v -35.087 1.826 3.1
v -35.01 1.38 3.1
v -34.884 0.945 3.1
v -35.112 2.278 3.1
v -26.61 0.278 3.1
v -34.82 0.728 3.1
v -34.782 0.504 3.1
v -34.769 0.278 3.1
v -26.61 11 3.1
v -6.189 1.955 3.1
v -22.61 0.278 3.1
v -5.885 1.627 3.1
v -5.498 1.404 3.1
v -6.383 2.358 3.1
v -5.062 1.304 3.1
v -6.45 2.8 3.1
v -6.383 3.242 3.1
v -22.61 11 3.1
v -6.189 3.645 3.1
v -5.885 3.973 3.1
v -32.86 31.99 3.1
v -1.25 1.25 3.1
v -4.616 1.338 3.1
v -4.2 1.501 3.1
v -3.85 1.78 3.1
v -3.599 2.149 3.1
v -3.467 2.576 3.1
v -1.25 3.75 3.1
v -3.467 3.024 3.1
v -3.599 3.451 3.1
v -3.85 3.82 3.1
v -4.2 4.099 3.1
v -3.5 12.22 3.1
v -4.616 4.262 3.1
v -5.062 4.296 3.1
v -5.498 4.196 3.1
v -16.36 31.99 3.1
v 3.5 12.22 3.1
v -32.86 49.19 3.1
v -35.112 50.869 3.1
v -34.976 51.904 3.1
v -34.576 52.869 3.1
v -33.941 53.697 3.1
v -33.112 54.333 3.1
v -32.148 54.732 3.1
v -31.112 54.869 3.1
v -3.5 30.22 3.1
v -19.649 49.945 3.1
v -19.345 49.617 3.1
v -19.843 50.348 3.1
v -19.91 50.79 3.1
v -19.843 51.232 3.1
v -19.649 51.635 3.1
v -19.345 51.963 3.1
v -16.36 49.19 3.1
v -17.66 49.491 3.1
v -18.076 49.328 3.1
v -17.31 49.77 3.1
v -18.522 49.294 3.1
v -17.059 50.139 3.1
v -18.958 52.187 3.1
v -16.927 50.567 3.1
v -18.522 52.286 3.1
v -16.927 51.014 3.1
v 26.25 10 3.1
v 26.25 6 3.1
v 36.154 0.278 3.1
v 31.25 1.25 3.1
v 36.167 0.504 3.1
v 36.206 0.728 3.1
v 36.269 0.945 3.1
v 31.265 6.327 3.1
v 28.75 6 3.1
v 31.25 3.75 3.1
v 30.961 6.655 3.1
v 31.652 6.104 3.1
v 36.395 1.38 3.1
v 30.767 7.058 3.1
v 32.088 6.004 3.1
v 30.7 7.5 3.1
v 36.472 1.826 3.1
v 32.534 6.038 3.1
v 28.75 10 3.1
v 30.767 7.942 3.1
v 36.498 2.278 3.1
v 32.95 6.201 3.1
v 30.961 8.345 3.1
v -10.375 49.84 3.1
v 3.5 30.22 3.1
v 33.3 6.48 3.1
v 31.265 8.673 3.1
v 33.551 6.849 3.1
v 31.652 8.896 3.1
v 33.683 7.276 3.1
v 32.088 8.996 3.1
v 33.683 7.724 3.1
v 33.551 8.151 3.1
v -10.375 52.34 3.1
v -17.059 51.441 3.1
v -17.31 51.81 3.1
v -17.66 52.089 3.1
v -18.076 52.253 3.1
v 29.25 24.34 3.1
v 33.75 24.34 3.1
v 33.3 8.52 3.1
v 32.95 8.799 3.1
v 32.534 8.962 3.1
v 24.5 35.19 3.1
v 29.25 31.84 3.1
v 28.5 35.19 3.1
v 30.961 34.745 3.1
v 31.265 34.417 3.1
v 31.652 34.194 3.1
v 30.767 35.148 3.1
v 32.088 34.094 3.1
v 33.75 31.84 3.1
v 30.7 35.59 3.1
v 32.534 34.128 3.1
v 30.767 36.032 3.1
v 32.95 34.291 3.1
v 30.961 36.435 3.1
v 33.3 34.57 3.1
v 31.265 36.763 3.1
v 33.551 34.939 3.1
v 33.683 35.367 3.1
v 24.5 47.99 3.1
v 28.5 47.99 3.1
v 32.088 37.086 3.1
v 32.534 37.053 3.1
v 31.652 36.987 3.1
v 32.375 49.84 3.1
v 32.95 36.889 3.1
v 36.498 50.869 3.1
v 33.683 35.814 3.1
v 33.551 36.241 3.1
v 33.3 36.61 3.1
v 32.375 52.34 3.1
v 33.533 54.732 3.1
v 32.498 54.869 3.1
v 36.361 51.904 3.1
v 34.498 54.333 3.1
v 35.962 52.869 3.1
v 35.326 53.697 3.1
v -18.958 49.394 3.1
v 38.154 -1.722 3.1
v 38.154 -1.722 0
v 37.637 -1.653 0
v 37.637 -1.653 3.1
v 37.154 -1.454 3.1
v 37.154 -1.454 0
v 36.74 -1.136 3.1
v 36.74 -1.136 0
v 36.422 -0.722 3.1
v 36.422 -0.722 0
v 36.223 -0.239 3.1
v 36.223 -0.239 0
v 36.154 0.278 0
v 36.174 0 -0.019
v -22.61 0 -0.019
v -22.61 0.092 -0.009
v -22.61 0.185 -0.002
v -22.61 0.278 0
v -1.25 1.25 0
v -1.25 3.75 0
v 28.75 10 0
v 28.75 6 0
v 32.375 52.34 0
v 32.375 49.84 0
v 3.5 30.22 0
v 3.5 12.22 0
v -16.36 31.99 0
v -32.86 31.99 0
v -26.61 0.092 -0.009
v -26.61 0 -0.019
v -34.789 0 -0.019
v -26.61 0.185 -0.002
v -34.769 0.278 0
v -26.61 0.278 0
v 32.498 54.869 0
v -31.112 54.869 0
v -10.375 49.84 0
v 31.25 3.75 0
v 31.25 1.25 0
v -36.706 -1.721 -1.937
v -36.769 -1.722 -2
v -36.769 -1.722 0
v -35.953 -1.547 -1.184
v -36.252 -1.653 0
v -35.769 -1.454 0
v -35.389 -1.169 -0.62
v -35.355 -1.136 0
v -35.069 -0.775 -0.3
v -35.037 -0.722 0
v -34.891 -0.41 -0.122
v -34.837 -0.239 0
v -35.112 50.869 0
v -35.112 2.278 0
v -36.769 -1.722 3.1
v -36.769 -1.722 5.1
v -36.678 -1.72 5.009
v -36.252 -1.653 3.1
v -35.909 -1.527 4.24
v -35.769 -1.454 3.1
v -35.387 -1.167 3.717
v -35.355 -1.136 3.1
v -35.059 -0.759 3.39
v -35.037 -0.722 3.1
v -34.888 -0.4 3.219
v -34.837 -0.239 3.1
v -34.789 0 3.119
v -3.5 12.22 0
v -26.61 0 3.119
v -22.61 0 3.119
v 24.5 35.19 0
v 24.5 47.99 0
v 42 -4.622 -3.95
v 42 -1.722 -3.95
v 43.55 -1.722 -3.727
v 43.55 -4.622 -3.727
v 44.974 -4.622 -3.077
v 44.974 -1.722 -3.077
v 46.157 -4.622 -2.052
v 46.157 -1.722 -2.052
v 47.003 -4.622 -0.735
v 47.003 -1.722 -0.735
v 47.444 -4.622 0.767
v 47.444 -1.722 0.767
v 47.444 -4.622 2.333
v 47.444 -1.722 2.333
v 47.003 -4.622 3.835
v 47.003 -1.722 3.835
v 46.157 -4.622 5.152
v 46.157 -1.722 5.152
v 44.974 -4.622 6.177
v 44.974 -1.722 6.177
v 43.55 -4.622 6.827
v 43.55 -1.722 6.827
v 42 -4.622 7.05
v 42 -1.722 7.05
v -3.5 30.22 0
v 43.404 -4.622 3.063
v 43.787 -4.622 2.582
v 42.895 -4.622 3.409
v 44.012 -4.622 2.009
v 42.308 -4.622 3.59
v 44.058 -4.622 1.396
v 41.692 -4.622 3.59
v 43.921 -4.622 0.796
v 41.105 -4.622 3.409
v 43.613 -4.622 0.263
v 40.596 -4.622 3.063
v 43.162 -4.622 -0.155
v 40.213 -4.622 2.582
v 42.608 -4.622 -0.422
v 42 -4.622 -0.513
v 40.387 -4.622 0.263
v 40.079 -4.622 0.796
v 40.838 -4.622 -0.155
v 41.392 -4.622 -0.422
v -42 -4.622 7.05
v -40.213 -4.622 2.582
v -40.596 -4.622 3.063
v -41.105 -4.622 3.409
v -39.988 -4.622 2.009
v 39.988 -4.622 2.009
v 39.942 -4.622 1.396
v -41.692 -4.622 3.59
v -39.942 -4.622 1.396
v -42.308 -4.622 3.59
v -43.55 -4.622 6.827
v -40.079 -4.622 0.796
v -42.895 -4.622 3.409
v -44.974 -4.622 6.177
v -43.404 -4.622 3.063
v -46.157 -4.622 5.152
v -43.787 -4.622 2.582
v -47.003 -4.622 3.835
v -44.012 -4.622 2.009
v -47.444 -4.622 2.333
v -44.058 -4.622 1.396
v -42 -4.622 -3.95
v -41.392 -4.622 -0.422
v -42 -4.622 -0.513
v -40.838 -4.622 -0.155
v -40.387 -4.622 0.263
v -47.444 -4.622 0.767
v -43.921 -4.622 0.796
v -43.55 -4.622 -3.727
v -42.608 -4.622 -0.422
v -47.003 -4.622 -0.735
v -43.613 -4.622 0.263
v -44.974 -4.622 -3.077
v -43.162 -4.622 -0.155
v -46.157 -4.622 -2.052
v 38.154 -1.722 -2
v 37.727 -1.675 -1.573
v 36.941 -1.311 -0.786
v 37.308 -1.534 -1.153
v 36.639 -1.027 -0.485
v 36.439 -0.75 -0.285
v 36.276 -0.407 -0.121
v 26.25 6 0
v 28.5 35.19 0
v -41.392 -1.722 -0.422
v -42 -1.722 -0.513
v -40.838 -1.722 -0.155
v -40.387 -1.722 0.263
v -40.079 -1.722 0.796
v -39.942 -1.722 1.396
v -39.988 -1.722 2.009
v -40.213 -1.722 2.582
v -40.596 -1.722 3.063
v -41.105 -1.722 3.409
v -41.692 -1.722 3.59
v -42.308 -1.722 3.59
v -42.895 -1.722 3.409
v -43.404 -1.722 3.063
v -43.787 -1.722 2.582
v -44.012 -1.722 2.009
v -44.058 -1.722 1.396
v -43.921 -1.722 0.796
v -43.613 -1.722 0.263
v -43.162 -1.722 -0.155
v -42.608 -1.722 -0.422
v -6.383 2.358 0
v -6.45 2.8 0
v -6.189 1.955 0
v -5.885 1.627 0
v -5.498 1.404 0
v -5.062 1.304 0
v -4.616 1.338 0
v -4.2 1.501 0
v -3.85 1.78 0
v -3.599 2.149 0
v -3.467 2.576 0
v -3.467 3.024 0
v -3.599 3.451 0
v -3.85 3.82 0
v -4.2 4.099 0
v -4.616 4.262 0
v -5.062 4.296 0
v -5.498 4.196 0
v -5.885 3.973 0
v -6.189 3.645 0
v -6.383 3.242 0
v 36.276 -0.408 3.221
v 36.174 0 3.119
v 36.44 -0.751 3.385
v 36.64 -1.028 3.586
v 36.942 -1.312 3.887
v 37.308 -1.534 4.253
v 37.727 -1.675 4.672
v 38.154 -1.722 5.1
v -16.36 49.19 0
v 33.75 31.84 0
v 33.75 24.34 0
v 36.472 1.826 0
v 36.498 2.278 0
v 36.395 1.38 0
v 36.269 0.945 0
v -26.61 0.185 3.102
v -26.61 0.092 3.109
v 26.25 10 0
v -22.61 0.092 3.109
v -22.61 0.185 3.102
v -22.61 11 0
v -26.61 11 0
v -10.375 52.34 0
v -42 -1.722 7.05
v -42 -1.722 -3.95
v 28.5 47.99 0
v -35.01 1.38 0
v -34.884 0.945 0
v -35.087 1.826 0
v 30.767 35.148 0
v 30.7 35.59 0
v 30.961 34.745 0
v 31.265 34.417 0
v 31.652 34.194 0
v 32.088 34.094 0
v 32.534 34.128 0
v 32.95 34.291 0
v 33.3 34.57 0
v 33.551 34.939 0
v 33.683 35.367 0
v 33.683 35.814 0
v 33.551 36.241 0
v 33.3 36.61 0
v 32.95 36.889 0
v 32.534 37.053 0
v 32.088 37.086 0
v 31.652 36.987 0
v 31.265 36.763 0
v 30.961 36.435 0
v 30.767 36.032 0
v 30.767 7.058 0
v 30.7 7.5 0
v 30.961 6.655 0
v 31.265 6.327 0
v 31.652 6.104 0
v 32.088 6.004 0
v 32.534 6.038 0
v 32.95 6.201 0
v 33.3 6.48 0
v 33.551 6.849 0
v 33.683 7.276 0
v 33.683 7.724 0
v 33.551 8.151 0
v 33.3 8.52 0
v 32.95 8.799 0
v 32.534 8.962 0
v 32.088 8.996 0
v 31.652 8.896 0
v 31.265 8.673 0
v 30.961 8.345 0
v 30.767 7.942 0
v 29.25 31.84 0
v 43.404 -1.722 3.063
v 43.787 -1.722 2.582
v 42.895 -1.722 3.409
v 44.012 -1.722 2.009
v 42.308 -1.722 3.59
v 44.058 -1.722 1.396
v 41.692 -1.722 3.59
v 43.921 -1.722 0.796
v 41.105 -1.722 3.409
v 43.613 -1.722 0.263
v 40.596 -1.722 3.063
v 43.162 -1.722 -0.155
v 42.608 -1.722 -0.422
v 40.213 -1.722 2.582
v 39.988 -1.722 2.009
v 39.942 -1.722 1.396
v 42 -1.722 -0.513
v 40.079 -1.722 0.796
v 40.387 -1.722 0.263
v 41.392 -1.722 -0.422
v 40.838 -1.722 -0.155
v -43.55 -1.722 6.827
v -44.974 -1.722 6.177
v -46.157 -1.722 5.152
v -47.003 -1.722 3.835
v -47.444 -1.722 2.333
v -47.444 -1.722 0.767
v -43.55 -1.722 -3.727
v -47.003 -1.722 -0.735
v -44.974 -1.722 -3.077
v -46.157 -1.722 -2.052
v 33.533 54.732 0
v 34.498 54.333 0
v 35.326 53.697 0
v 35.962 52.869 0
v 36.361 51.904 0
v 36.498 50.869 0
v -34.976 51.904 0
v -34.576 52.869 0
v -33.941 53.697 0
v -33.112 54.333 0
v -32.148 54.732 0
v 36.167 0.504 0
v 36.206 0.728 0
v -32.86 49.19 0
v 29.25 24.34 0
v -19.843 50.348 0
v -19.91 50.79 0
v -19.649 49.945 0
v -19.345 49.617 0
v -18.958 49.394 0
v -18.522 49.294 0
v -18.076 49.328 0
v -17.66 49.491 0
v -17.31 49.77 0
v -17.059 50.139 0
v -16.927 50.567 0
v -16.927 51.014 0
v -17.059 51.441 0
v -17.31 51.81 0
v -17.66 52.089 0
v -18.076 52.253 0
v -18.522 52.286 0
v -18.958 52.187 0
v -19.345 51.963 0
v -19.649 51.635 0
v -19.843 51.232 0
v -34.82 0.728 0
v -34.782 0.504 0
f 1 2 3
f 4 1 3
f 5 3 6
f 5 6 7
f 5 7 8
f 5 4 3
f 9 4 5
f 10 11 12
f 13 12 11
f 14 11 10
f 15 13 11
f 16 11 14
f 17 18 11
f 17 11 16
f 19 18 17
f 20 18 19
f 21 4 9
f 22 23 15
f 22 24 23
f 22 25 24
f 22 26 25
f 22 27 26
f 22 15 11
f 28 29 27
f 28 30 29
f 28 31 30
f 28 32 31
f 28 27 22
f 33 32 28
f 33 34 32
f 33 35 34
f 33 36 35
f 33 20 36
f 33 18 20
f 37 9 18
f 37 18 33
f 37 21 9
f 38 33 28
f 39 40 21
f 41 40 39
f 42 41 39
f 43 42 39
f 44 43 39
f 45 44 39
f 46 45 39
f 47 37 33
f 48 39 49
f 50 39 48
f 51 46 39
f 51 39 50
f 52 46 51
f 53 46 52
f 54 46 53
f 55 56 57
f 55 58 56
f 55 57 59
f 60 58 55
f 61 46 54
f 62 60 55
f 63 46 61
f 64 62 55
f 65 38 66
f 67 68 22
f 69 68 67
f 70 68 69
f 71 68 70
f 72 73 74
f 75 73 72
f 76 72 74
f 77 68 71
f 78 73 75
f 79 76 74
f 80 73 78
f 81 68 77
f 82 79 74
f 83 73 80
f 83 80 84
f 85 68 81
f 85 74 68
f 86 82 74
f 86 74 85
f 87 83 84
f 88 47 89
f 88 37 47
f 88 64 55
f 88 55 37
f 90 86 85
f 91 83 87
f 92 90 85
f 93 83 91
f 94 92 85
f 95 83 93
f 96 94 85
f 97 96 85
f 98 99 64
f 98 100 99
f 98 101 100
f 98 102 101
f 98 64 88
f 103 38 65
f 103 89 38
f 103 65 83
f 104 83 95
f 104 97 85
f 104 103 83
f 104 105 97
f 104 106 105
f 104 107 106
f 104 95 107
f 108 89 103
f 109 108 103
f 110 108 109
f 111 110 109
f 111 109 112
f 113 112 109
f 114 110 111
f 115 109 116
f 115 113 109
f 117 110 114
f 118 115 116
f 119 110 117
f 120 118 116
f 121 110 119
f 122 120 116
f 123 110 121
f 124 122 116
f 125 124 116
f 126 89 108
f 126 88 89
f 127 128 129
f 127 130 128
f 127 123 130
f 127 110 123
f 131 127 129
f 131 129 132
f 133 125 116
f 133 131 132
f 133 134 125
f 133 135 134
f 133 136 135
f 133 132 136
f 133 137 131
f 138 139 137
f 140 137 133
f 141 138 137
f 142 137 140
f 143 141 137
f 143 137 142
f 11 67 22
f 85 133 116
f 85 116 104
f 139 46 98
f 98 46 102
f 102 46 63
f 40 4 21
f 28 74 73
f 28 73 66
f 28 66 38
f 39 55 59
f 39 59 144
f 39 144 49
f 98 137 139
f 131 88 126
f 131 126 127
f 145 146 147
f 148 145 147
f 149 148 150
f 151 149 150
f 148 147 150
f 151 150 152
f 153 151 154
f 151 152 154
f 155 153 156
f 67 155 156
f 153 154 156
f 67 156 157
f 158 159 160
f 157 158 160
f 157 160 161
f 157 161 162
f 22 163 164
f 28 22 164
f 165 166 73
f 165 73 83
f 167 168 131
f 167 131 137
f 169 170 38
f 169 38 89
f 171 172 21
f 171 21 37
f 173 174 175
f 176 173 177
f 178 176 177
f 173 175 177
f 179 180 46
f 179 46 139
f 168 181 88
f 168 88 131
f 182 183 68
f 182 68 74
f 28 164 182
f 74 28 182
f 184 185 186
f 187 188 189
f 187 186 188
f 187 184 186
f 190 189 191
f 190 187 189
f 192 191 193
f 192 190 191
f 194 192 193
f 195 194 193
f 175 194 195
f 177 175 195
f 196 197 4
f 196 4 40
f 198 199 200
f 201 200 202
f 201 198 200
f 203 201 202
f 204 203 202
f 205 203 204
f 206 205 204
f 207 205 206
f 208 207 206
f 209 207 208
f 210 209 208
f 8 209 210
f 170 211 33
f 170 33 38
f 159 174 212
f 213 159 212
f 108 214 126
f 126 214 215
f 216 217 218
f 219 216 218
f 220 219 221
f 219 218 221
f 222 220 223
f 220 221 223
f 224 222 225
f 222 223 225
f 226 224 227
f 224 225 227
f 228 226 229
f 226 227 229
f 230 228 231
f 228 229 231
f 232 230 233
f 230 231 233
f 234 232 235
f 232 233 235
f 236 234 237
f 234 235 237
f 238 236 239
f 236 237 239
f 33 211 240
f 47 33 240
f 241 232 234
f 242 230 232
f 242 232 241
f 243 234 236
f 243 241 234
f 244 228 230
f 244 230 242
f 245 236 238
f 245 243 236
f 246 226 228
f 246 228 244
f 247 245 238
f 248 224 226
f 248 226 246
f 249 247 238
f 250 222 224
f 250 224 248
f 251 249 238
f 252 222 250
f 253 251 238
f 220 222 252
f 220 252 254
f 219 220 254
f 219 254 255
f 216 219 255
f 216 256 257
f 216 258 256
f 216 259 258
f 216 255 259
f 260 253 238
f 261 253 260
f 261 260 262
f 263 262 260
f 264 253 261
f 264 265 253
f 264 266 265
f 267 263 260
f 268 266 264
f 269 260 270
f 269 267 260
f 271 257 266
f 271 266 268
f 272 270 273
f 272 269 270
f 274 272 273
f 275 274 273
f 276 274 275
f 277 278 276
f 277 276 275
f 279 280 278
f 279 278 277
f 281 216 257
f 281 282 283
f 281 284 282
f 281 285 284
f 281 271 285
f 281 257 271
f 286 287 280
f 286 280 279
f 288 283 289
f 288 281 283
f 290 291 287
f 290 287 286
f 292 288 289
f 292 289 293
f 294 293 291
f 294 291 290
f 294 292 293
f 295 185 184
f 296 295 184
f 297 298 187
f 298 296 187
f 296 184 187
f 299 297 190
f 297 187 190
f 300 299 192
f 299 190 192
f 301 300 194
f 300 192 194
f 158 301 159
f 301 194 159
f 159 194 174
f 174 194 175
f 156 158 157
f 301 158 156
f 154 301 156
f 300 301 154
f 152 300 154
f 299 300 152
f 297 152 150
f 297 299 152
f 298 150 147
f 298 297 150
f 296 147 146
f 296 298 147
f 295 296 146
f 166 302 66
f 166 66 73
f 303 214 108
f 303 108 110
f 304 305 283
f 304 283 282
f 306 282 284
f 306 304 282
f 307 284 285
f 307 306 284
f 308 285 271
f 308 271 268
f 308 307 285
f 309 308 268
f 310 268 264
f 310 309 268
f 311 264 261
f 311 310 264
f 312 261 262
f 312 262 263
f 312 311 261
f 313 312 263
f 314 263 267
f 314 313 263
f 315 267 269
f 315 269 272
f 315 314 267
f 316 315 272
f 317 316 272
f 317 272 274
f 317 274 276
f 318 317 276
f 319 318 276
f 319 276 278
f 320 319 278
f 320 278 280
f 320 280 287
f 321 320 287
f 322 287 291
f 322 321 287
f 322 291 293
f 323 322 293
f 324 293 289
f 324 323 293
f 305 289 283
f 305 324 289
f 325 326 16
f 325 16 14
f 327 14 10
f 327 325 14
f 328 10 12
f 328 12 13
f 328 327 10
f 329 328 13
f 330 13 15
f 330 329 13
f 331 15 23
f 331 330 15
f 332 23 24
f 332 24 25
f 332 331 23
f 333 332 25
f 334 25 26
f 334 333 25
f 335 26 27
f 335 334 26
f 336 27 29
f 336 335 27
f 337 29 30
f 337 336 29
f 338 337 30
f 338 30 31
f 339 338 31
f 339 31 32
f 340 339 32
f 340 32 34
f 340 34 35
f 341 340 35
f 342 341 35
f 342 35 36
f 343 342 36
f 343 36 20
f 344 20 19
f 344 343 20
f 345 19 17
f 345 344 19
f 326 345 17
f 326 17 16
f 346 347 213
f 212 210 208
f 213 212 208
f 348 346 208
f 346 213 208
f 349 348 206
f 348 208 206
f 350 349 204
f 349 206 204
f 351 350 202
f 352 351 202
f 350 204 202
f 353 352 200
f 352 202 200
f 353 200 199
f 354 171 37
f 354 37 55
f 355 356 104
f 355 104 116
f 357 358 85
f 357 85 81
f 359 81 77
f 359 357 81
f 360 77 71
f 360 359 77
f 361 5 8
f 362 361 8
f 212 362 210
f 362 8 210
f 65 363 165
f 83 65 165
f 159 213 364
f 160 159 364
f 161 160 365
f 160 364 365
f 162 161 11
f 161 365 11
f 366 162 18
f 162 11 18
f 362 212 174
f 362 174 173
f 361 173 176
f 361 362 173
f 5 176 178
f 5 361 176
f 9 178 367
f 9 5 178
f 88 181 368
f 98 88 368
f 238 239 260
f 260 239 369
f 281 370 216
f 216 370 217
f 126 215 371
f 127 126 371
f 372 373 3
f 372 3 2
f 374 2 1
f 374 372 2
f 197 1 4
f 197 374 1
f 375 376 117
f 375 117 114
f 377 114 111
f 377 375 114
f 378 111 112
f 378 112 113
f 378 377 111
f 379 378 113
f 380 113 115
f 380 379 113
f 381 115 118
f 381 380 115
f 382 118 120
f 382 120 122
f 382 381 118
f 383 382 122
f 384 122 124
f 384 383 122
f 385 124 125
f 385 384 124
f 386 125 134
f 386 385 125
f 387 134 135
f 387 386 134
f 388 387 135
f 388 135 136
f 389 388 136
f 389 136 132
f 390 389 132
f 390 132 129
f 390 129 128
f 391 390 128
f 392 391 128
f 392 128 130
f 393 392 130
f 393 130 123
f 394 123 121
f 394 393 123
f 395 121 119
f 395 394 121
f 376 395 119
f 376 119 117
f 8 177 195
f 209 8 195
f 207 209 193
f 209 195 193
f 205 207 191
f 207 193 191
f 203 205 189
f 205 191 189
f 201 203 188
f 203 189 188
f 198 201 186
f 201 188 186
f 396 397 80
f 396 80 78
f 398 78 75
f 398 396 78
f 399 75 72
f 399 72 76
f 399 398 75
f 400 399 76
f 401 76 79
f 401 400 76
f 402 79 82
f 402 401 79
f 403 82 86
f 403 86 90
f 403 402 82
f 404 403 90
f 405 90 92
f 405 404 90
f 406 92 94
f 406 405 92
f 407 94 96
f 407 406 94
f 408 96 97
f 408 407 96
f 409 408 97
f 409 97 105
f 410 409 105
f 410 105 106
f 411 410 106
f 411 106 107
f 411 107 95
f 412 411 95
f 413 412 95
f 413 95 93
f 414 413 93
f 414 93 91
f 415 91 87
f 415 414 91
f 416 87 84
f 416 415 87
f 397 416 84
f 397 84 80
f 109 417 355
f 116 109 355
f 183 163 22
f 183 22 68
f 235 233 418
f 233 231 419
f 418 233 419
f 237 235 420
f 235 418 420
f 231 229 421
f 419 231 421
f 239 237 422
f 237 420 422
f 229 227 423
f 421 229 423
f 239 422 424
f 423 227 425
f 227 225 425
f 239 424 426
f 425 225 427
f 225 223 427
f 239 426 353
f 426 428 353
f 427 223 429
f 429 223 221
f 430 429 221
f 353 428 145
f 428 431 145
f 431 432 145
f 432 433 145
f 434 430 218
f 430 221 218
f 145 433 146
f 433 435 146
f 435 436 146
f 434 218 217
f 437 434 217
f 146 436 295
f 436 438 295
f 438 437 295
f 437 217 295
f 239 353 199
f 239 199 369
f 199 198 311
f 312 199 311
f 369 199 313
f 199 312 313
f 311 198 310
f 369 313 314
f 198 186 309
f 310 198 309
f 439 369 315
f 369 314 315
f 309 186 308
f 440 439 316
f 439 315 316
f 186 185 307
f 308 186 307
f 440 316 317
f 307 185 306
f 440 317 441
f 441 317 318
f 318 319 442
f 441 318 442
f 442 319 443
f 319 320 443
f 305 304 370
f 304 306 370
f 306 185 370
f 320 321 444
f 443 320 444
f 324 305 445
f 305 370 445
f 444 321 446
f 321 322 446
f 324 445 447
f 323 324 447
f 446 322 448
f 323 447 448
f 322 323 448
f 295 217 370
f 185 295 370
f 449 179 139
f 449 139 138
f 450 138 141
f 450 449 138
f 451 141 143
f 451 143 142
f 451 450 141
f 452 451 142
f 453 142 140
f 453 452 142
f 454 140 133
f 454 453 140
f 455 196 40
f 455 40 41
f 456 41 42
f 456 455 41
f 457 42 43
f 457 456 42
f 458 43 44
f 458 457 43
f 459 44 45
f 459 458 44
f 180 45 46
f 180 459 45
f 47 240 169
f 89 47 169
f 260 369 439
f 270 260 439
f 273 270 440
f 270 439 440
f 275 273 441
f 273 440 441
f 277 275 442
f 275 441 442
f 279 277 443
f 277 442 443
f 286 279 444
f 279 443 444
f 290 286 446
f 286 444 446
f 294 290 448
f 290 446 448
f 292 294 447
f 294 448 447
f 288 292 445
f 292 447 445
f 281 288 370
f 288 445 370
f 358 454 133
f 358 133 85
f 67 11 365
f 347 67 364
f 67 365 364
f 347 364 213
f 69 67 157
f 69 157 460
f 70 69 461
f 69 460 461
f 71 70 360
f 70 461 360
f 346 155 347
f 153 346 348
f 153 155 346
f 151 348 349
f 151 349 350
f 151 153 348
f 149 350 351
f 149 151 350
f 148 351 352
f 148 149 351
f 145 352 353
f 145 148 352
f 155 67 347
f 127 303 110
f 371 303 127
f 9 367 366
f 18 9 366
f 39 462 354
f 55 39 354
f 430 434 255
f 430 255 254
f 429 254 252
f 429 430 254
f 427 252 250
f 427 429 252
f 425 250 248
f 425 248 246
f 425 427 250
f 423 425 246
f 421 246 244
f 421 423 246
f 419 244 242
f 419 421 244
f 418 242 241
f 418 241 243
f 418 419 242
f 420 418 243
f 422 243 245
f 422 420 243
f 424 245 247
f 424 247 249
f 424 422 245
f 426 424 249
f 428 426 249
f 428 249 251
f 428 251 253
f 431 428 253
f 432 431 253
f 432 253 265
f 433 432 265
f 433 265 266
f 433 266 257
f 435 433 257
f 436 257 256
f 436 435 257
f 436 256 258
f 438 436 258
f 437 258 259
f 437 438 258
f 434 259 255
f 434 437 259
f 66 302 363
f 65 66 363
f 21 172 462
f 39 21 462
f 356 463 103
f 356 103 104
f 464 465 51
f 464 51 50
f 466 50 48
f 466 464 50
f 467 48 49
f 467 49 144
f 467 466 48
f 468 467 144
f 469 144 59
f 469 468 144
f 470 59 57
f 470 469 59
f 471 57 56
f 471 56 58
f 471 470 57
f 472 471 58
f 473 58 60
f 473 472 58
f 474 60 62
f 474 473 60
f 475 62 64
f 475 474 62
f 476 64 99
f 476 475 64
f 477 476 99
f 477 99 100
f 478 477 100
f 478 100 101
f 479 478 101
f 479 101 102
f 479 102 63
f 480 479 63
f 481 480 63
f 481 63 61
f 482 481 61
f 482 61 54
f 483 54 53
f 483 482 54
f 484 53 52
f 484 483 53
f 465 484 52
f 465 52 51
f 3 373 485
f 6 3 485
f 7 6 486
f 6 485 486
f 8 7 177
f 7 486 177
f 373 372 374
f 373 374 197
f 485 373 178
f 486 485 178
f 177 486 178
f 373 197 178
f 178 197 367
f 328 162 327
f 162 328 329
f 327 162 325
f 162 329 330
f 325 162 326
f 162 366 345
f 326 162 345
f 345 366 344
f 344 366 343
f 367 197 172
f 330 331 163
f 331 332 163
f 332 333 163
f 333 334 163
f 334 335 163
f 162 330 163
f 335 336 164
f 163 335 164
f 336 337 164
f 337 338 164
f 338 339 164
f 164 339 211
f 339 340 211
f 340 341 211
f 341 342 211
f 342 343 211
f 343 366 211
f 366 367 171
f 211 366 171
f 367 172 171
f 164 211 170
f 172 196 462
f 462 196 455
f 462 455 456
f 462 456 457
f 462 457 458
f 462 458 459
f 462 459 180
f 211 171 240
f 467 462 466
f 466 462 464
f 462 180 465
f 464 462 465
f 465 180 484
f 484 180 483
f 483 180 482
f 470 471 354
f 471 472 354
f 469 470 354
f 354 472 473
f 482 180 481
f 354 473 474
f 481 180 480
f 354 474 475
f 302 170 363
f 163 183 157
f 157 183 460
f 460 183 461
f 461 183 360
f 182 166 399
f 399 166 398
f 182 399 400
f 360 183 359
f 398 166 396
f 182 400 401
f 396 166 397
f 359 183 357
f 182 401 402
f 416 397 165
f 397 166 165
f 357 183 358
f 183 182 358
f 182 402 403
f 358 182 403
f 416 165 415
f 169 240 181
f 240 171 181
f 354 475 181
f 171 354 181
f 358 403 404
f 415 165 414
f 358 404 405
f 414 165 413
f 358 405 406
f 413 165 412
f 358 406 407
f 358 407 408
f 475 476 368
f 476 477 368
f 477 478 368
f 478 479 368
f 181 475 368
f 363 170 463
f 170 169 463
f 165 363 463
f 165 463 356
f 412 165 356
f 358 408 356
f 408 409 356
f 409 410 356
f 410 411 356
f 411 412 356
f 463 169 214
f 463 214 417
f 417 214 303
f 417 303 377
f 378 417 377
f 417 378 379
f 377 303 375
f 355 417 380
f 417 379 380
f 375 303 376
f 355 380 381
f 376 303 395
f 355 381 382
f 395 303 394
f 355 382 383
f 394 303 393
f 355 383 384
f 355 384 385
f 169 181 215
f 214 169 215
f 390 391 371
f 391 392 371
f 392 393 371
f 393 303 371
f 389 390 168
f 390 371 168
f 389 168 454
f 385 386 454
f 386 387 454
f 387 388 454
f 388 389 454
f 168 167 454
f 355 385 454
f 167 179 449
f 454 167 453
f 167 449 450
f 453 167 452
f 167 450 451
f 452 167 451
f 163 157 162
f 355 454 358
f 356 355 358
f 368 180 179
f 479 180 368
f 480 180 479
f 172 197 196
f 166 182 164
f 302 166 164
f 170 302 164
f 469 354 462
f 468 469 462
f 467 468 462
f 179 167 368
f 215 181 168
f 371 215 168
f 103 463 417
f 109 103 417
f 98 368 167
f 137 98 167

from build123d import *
from build123d.topology import SkipClean

# Parameters (mm, degrees)
SKETCH1_R           = 1.5
SKETCH1_W           = 16.5
SKETCH1_H           = 17.2
SKETCH1_W_2         = 7
SKETCH1_H_2         = 18
SKETCH1_W_3         = 42.75
SKETCH1_H_3         = 2.5
SKETCH1_W_4         = 4
SKETCH1_H_4         = 12.8
SKETCH1_W_5         = 4.5
SKETCH1_H_5         = 7.5
SKETCH1_W_6         = 2.5
SKETCH1_H_6         = 4
SKETCH1_W_7         = 32.5
SKETCH1_H_7         = 11
BOSS_EXTRUDE1_DEPTH = 3.1
SKETCH2_R           = 2.0635
BOSS_EXTRUDE2_DEPTH = 2.9
FILLET1_DEPTH       = 3.1
FILLET1_START       = -36.769210249
FILLET1_2_DEPTH     = 74.923708499
FILLET1_START_2     = -22.61
FILLET1_3_DEPTH     = 60.0761
FILLET1_START_3     = -36.399689195
FILLET1_4_DEPTH     = 9.789689195
FILLET1_START_4     = -2
FILLET1_5_DEPTH     = 7.1


with BuildPart() as part:
    # Sketch1 → Boss-Extrude1 (new body)
    with BuildSketch(Plane.XY):
        with BuildLine():
            Line((-35.112356, 2.278375887), (-35.112356, 50.868606365))
            ThreePointArc((-35.112356, 50.868606365), (-33.940783125, 53.697033489), (-31.112356, 54.868606365))
            Line((-31.112356, 54.868606365), (32.497644, 54.868606365))
            ThreePointArc((32.497644, 54.868606365), (35.326071125, 53.697033489), (36.497644, 50.868606365))
            Line((36.497644, 50.868606365), (36.497644, 2.278375887))
            ThreePointArc((36.497644, 2.278375887), (35.326071125, -0.550051237), (32.497644, -1.721624113))
            Line((32.497644, -1.721624113), (-31.112356, -1.721624113))
            ThreePointArc((-31.112356, -1.721624113), (-33.940783125, -0.550051237), (-35.112356, 2.278375887))
        make_face()
        with Locations(Location((-18.41, 50.790230477, 0), (0, 0, 180))):
            Circle(SKETCH1_R, mode=Mode.SUBTRACT)
        with Locations(Location((-4.95, 2.8, 0), (0, 0, 180))):
            Circle(SKETCH1_R, mode=Mode.SUBTRACT)
        with Locations(Location((32.2, 7.5, 0), (0, 0, 180))):
            Circle(SKETCH1_R, mode=Mode.SUBTRACT)
        with Locations(Location((32.2, 35.590230477, 0), (0, 0, 180))):
            Circle(SKETCH1_R, mode=Mode.SUBTRACT)
        with Locations((-24.61, 40.590230477)):
            Rectangle(SKETCH1_W, SKETCH1_H, mode=Mode.SUBTRACT)
        with Locations((0, 21.22)):
            Rectangle(SKETCH1_W_2, SKETCH1_H_2, mode=Mode.SUBTRACT)
        with Locations((11, 51.090230477)):
            Rectangle(SKETCH1_W_3, SKETCH1_H_3, mode=Mode.SUBTRACT)
        with Locations((26.5, 41.590230477)):
            Rectangle(SKETCH1_W_4, SKETCH1_H_4, mode=Mode.SUBTRACT)
        with Locations((31.5, 28.090230477)):
            Rectangle(SKETCH1_W_5, SKETCH1_H_5, mode=Mode.SUBTRACT)
        with Locations((27.5, 8)):
            Rectangle(SKETCH1_W_6, SKETCH1_H_6, mode=Mode.SUBTRACT)
        with Locations((15, 2.5)):
            Rectangle(SKETCH1_W_7, SKETCH1_H_3, mode=Mode.SUBTRACT)
        with Locations((-24.61, 5.5)):
            Rectangle(SKETCH1_W_4, SKETCH1_H_7, mode=Mode.SUBTRACT)
    extrude(amount=BOSS_EXTRUDE1_DEPTH)

    # Sketch2 → Boss-Extrude2 (add)
    with BuildSketch(Plane(origin=(0, -1.721624113, 0), x_dir=(-1, 0, 0), z_dir=(0, -1, 0))):
        with BuildLine():
            Line((42, 3.95), (-42, 3.95))
            ThreePointArc((-42, 3.95), (-47.5, -1.55), (-42, -7.05))
            Line((-42, -7.05), (42, -7.05))
            ThreePointArc((42, -7.05), (47.5, -1.55), (42, 3.95))
        make_face()
        with Locations(Location((-42, -1.55, 0), (0, 0, 90))):
            Circle(SKETCH2_R, mode=Mode.SUBTRACT)
        with Locations(Location((42, -1.55, 0), (0, 0, 90))):
            Circle(SKETCH2_R, mode=Mode.SUBTRACT)
    extrude(amount=BOSS_EXTRUDE2_DEPTH)

    # Fillet1: read off the stored shape, not the designer's step
    # Fillet1 outline → Fillet1 (add)
    with BuildSketch(Plane.XY):
        with BuildLine():
            ThreePointArc((-31.112356, -1.721624113), (-33.421757077, -0.987610436), (-34.883592166, 0.945042554))
            ThreePointArc((-34.883592166, 0.945042554), (-35.136217087, -0.876324651), (-36.769210249, -1.721624113))
            Line((-36.769210249, -1.721624113), (-31.112356, -1.721624113))
        make_face()
        with BuildLine():
            ThreePointArc((36.268880166, 0.945042554), (34.807045077, -0.987610436), (32.497644, -1.721624113))
            Line((32.497644, -1.721624113), (38.15449825, -1.721624113))
            ThreePointArc((38.15449825, -1.721624113), (36.521505088, -0.876324651), (36.268880166, 0.945042554))
        make_face()
    extrude(amount=FILLET1_DEPTH)

    # Fillet1 2 outline → Fillet1 2 (add)
    with BuildSketch(Plane.YZ.offset(FILLET1_START)):
        with BuildLine():
            ThreePointArc((0, 3.119468035), (-1.231053106, 3.787893254), (-1.721624113, 5.1))
            Line((-1.721624113, 5.1), (-1.721624113, 3.1))
            Line((-1.721624113, 3.1), (0, 3.1))
            Line((0, 3.1), (0, 3.119468035))
        make_face()
        with BuildLine():
            Line((0, 0), (-1.721624113, 0))
            Line((-1.721624113, 0), (-1.721624113, -2))
            ThreePointArc((-1.721624113, -2), (-1.231053106, -0.687893254), (0, -0.019468035))
            Line((0, -0.019468035), (0, 0))
        make_face()
    extrude(amount=FILLET1_2_DEPTH)

    # Fillet1 3 outline → Fillet1 3 (add)
    with BuildSketch(Plane.YZ.offset(FILLET1_START_2)):
        with BuildLine():
            ThreePointArc((0.278375887, 3.1), (0.138847988, 3.104872945), (0, 3.119468035))
            Line((0, 3.119468035), (0, 3.1))
            Line((0, 3.1), (0.278375887, 3.1))
        make_face()
        with BuildLine():
            Line((0.278375887, 0), (0, 0))
            Line((0, 0), (0, -0.019468035))
            ThreePointArc((0, -0.019468035), (0.138847988, -0.004872945), (0.278375887, 0))
        make_face()
    extrude(amount=FILLET1_3_DEPTH)

    # Fillet1 4 outline → Fillet1 4 (add)
    with BuildSketch(Plane.YZ.offset(FILLET1_START_3)):
        with BuildLine():
            ThreePointArc((0.278375887, 3.1), (0.138847988, 3.104872945), (0, 3.119468035))
            Line((0, 3.119468035), (0, 3.1))
            Line((0, 3.1), (0.278375887, 3.1))
        make_face()
        with BuildLine():
            Line((0.278375887, 0), (0, 0))
            Line((0, 0), (0, -0.019468035))
            ThreePointArc((0, -0.019468035), (0.138847988, -0.004872945), (0.278375887, 0))
        make_face()
    extrude(amount=FILLET1_4_DEPTH)

    # Fillet1 5 outline → Fillet1 5 (cut)
    with SkipClean():  # the faces are left unmerged after this step: merging them gives an invalid solid
        with BuildSketch(Plane.XY.offset(FILLET1_START_4)):
            with BuildLine():
                Line((-36.399689195, 0.278375887), (-36.399689195, 0))
                Line((-36.399689195, 0), (-36.769210249, 0))
                Line((-36.769210249, 0), (-36.769210249, -1.721624113))
                ThreePointArc((-36.769210249, -1.721624113), (-35.354996687, -1.135837675), (-34.769210249, 0.278375887))
                Line((-34.769210249, 0.278375887), (-36.399689195, 0.278375887))
            make_face()
            with BuildLine():
                Line((38.15449825, -1.721624113), (38.15449825, 0))
                Line((38.15449825, 0), (37.4661, 0))
                Line((37.4661, 0), (37.4661, 0.278375887))
                Line((37.4661, 0.278375887), (36.15449825, 0.278375887))
                ThreePointArc((36.15449825, 0.278375887), (36.740284688, -1.135837675), (38.15449825, -1.721624113))
            make_face()
        extrude(amount=FILLET1_5_DEPTH, mode=Mode.SUBTRACT)


solid = part.part
